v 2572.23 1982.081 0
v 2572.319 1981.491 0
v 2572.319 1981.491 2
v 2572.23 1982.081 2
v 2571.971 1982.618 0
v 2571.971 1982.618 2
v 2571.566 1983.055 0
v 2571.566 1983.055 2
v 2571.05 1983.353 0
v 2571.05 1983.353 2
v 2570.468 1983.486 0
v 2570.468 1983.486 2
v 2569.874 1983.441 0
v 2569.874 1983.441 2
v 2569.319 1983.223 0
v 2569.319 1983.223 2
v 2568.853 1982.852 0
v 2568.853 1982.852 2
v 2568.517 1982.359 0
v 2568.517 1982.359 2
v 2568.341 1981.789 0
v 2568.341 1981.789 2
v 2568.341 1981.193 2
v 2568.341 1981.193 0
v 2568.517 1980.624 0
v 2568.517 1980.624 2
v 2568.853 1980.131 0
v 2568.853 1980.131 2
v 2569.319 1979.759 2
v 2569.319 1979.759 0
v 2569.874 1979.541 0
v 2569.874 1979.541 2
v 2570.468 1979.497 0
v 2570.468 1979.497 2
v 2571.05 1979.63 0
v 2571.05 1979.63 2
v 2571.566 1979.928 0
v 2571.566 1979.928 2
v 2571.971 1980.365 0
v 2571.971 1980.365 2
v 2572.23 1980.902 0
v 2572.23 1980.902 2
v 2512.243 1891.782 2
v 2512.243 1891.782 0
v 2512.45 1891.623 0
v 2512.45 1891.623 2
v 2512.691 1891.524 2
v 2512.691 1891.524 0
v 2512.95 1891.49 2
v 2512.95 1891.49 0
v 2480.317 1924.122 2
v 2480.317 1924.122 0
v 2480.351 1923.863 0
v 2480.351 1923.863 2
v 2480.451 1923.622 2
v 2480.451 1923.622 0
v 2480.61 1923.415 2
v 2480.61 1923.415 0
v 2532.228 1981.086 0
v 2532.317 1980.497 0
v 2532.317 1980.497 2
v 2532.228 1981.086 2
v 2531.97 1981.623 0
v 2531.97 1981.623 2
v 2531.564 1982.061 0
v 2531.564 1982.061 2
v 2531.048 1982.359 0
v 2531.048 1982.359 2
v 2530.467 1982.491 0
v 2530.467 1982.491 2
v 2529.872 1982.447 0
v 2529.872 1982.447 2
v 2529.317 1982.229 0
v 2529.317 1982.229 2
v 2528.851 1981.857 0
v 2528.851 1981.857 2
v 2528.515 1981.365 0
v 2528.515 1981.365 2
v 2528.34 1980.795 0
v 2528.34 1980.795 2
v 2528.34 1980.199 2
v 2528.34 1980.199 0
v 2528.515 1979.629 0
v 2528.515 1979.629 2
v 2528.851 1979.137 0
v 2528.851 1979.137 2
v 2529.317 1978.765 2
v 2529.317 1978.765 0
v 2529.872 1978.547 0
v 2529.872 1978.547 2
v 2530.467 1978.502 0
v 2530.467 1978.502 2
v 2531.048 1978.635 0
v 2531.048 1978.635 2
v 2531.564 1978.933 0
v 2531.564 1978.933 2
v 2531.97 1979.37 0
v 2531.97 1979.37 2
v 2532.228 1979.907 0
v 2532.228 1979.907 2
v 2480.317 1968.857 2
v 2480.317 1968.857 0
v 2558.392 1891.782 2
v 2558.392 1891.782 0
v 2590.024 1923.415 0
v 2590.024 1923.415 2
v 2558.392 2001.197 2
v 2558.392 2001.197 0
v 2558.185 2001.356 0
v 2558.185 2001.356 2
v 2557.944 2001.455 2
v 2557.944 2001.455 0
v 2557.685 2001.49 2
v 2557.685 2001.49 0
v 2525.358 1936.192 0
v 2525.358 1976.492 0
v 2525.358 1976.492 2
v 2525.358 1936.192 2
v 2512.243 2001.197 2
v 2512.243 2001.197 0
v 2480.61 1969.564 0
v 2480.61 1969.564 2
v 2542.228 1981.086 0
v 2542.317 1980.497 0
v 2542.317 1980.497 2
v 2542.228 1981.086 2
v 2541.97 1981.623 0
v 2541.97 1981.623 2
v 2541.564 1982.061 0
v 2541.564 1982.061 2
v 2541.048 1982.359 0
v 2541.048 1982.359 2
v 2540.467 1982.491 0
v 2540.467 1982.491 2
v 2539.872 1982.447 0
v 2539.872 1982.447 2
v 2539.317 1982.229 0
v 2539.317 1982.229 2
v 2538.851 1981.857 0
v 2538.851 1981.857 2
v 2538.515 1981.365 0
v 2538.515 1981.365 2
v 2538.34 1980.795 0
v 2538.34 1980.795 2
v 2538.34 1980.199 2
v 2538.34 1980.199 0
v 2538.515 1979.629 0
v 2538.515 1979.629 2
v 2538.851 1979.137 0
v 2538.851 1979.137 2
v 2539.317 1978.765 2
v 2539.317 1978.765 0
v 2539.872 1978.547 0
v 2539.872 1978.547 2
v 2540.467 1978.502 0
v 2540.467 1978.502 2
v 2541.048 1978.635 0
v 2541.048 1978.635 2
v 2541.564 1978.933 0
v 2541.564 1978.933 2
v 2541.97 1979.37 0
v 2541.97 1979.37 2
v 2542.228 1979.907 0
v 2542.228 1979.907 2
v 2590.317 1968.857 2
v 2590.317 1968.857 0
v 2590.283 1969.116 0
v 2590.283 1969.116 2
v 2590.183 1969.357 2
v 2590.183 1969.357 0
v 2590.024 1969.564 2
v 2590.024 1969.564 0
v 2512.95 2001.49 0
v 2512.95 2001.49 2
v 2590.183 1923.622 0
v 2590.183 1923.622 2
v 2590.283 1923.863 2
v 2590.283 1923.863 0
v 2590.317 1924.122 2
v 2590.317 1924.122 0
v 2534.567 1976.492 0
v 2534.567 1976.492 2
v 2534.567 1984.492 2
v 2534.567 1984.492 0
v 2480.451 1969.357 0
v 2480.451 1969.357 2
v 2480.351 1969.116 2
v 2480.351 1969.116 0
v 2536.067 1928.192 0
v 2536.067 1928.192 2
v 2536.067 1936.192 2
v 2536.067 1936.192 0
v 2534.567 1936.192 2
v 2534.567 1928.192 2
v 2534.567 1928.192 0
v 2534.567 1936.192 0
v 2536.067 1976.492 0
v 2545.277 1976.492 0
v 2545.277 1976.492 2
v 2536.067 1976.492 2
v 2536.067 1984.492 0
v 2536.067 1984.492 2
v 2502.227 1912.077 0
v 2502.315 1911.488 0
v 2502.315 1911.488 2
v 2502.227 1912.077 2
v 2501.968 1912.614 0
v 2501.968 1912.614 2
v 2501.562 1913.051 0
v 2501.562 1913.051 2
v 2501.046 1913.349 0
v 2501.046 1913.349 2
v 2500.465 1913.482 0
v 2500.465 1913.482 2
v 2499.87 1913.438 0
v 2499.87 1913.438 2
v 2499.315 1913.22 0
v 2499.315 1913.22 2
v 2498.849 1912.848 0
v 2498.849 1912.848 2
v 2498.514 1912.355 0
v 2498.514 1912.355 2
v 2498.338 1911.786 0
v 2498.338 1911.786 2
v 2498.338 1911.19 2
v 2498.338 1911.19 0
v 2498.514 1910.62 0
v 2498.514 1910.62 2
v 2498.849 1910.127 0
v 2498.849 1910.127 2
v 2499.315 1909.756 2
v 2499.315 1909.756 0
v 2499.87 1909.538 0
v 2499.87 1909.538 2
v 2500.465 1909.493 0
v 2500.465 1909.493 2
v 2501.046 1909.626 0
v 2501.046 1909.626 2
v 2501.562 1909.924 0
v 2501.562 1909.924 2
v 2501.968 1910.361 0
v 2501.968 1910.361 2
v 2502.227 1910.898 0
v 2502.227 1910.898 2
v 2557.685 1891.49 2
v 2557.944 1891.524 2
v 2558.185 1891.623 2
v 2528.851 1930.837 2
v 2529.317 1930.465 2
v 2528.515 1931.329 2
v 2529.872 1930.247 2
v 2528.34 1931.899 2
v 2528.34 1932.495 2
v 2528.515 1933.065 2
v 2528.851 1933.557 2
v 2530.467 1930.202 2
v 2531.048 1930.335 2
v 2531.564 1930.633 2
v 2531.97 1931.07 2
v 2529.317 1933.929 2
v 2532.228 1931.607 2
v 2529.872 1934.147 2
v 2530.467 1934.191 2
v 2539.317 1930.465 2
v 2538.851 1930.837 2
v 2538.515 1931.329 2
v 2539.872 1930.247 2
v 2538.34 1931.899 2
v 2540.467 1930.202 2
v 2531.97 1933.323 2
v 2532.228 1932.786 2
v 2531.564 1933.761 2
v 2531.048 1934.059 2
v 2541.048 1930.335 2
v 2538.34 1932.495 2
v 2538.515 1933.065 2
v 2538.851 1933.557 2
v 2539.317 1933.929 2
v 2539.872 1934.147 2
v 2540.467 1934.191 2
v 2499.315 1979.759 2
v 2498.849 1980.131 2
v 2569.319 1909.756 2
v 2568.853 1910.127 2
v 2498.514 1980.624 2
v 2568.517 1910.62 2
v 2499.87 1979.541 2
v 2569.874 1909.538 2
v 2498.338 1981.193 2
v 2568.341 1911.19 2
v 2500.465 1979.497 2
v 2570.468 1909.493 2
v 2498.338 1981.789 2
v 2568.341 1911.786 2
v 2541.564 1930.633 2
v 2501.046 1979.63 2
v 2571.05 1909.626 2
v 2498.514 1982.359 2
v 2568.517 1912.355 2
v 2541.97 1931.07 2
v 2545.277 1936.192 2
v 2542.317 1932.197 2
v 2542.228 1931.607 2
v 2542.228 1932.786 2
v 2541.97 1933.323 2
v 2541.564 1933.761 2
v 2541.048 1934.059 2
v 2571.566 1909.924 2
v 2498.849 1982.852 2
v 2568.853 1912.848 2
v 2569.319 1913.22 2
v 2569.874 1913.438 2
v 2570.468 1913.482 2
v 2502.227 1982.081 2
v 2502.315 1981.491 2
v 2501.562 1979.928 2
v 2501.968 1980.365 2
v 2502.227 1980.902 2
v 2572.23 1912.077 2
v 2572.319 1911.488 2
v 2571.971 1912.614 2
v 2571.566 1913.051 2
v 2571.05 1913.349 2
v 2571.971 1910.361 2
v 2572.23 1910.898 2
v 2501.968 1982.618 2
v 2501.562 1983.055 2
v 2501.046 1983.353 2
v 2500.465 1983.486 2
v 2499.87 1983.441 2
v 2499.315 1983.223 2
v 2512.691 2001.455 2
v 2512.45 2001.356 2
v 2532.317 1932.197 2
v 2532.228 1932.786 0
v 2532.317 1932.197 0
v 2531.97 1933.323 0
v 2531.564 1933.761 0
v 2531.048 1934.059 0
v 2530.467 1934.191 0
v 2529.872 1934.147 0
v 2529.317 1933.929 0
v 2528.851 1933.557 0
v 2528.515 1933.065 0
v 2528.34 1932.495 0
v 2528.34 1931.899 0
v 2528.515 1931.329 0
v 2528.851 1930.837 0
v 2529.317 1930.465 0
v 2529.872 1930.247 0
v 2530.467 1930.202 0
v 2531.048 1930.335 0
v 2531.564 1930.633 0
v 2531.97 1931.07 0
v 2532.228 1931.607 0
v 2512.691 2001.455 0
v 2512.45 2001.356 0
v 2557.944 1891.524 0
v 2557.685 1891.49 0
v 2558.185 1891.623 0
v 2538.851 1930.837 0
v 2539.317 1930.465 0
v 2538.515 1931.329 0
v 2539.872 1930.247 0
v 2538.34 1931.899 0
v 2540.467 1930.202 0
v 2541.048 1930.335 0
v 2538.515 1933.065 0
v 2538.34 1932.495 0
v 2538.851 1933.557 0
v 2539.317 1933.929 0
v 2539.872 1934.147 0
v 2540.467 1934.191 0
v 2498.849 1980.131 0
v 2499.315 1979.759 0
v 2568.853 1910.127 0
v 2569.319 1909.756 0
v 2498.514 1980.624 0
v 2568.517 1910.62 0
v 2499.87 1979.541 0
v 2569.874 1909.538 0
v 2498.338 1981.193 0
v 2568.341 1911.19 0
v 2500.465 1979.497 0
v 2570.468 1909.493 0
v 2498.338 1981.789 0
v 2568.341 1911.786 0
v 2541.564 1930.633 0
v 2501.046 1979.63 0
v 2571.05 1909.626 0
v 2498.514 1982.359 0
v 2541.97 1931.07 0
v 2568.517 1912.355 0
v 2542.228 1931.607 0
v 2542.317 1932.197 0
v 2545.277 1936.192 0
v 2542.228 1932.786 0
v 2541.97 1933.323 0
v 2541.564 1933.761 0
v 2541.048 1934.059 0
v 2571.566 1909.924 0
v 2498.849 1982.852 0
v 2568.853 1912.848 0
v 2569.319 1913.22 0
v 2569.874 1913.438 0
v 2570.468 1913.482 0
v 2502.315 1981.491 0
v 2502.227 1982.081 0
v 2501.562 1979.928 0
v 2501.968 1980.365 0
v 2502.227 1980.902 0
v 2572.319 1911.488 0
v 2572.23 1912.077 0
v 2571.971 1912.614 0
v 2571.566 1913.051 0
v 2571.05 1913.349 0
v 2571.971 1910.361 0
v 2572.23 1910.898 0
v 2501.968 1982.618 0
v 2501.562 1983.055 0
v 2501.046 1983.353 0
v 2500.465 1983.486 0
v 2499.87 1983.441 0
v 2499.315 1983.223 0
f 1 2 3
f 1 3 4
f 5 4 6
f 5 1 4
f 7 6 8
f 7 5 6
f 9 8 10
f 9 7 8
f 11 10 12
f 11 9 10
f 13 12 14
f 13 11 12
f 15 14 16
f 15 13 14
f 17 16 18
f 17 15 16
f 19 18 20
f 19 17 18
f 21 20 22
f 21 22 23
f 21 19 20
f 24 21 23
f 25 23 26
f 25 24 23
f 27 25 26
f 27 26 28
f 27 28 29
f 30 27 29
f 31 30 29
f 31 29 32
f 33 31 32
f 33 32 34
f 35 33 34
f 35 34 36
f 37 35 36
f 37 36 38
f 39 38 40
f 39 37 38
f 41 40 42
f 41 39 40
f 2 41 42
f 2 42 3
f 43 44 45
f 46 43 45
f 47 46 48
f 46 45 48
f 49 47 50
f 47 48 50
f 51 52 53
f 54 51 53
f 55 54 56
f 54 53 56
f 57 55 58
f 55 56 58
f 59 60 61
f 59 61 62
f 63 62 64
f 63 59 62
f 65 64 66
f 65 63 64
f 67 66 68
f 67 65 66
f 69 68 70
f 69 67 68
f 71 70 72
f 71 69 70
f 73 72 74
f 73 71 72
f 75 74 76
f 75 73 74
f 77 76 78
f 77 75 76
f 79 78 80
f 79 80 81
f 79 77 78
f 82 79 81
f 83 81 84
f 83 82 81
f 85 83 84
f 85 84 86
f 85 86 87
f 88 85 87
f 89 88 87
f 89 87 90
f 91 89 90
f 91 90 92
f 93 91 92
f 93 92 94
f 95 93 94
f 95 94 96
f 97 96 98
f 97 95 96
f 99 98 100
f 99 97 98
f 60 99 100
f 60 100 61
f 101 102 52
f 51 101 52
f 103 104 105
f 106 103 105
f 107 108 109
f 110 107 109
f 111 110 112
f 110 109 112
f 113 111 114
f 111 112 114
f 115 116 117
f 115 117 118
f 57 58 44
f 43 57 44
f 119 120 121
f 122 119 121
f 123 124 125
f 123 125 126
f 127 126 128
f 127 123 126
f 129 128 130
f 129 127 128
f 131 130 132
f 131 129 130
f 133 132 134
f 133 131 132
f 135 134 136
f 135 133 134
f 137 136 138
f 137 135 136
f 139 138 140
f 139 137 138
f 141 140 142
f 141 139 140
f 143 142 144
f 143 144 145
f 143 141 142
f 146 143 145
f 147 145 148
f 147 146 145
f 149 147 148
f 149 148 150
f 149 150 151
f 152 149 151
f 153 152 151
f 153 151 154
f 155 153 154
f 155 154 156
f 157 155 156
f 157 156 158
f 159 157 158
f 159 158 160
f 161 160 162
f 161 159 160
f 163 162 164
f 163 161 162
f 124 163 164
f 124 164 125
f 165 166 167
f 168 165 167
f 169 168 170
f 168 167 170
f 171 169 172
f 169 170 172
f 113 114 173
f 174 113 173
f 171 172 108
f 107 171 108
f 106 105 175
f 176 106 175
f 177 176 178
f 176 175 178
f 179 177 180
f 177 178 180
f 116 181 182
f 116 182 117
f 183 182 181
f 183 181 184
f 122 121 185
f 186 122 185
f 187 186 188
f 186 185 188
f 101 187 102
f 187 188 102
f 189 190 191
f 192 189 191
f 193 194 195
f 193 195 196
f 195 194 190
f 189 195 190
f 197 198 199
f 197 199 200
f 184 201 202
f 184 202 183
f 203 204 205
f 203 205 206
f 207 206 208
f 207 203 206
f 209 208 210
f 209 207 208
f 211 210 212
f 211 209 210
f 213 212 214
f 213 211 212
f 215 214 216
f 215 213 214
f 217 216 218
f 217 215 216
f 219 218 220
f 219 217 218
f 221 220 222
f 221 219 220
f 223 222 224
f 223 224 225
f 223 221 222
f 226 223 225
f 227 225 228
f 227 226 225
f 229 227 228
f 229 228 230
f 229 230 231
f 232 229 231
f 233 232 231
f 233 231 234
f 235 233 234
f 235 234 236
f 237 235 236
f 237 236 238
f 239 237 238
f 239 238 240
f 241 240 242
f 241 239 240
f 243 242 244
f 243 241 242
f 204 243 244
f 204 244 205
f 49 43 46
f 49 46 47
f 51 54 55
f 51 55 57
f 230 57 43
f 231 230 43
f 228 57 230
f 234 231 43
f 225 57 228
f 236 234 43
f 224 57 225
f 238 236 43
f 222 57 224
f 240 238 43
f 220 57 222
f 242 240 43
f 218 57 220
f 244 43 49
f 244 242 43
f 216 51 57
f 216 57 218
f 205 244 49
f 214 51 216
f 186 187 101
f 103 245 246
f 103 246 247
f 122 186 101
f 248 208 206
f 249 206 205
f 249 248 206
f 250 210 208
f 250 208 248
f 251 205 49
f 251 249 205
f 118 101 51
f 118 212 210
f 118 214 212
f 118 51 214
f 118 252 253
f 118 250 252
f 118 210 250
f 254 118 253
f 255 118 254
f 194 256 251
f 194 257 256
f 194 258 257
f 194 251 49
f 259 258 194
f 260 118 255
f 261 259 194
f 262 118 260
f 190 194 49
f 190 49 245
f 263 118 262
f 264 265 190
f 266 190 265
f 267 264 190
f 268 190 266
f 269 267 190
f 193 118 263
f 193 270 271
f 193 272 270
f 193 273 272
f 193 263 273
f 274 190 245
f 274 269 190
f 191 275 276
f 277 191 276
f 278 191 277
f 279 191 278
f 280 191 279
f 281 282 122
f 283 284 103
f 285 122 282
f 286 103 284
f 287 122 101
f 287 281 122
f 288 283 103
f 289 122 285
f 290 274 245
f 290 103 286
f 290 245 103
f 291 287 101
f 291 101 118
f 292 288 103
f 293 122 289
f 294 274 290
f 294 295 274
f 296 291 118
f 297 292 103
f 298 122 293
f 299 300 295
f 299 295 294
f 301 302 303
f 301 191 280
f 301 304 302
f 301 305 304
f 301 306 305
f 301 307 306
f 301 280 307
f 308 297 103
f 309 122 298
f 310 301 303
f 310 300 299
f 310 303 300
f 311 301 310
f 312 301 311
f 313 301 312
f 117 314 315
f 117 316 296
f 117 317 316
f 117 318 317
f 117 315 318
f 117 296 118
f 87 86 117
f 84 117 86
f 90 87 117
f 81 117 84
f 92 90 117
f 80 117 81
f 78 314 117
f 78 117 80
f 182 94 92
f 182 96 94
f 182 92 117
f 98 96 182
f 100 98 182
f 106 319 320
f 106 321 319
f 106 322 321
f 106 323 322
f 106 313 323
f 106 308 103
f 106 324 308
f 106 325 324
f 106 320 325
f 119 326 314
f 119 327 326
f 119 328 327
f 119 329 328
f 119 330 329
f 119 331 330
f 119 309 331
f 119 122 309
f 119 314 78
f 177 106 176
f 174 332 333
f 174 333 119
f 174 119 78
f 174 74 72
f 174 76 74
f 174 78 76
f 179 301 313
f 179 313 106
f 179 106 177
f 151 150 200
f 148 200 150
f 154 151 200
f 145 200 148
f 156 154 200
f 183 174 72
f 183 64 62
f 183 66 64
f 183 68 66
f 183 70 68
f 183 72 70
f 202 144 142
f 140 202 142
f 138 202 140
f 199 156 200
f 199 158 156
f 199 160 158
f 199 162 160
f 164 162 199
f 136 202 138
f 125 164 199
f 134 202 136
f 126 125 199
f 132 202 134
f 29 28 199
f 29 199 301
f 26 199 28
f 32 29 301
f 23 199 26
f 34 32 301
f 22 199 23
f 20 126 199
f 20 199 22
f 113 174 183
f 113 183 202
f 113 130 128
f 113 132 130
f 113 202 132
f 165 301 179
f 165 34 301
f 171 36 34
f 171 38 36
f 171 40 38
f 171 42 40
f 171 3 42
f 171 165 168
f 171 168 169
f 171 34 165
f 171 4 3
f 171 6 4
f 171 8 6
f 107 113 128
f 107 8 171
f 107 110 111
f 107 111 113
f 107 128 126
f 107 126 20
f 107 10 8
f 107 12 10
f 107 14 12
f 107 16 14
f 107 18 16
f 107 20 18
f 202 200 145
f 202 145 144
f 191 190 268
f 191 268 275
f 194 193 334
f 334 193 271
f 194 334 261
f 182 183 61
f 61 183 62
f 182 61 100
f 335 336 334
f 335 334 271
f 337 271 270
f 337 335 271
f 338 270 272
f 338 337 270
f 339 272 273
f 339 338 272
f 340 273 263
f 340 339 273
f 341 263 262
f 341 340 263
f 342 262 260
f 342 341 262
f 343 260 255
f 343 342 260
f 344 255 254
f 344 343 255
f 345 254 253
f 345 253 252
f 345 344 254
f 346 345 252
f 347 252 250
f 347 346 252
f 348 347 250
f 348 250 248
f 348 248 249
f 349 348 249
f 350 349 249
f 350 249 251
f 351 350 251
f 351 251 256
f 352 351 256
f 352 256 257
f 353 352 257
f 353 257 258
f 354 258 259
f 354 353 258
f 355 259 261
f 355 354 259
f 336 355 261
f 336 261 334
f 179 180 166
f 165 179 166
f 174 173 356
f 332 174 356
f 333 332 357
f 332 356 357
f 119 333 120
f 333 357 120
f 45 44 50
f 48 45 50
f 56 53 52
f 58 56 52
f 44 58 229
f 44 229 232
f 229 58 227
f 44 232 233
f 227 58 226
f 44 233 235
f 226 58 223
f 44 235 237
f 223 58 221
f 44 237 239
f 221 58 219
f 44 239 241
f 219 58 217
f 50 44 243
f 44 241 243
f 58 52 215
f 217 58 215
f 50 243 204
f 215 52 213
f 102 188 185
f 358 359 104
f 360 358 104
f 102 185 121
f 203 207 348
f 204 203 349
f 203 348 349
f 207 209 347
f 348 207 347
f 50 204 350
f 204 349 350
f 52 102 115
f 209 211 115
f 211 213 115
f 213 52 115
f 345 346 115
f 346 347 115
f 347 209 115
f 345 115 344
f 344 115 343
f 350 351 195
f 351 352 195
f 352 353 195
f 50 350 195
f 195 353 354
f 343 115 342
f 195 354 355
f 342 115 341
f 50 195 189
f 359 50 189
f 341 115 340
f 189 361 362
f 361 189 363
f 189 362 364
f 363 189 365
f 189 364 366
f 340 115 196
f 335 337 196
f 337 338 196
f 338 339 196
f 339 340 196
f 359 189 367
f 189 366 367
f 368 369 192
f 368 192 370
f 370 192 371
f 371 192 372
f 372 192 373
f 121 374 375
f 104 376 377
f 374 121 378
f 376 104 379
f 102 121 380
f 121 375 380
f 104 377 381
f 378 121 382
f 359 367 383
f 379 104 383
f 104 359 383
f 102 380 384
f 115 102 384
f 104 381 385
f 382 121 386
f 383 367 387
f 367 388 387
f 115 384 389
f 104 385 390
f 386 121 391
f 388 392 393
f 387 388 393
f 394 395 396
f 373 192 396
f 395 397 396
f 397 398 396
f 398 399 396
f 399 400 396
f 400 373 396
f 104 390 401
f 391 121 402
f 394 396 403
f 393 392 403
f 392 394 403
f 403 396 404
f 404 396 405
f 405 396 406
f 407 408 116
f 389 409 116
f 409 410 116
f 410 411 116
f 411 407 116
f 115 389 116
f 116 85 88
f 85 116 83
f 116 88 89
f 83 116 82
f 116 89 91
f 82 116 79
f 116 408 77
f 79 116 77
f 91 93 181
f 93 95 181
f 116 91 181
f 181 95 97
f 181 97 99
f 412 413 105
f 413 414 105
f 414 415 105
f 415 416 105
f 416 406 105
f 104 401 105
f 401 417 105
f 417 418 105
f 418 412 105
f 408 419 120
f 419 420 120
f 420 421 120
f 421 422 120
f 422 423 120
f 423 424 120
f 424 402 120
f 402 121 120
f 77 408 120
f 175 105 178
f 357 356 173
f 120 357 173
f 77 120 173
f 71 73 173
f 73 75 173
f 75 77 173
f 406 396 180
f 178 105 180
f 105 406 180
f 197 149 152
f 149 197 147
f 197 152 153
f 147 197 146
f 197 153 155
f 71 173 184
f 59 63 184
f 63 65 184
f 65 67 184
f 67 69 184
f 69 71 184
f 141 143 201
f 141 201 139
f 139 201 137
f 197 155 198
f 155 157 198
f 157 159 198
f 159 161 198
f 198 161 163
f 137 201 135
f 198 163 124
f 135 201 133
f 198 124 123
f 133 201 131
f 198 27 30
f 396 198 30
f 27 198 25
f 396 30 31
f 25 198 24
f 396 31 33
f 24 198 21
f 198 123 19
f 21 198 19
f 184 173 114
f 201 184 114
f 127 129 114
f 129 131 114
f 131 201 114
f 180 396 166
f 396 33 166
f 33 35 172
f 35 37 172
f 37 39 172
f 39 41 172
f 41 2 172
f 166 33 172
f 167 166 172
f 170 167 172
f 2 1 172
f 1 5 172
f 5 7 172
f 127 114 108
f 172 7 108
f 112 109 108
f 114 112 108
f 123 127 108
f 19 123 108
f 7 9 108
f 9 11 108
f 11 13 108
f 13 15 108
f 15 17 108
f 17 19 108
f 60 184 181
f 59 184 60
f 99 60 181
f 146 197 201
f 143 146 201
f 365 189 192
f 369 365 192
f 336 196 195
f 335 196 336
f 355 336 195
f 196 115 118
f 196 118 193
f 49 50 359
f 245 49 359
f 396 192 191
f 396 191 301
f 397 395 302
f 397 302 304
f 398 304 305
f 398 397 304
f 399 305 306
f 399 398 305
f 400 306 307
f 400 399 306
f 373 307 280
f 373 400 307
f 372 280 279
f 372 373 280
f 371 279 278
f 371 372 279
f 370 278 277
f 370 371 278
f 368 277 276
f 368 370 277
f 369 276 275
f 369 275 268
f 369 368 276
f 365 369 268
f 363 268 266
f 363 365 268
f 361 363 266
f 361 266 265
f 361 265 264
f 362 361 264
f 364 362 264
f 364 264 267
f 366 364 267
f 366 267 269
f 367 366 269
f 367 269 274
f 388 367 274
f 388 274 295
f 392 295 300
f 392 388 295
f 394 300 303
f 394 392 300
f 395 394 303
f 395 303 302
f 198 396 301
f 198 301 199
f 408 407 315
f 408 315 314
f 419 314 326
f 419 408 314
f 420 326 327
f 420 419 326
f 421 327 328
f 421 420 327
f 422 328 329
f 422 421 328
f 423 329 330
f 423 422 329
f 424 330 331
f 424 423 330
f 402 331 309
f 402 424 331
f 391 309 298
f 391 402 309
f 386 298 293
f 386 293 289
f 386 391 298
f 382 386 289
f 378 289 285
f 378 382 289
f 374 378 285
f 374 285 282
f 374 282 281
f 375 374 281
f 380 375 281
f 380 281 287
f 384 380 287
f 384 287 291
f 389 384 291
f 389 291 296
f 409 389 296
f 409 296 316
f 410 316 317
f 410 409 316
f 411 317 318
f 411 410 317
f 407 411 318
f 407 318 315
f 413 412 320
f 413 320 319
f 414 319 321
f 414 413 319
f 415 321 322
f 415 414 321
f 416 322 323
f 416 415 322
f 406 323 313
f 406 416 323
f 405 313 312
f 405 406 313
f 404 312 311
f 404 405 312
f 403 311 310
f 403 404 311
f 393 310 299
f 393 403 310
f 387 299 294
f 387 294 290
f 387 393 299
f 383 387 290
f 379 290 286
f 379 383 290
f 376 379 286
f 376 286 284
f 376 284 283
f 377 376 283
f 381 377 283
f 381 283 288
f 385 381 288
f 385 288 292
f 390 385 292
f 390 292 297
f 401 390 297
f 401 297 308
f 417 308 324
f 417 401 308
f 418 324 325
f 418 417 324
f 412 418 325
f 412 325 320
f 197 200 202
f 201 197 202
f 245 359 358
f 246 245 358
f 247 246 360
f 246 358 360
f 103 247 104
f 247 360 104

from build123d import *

# Parameters (mm, degrees)
MODEL_R             = 2
EXTRUDE_1_DEPTH     = 2
SKETCH_3_W          = 0.1
SKETCH_3_H          = 8
CUT_EXTRUDE_1_DEPTH = 2
SKETCH_6_W          = 0.1
SKETCH_6_H          = 8
CUT_EXTRUDE_2_DEPTH = 2


with BuildPart() as part:
    # Model → 凸台-拉伸1 (new body)
    with BuildSketch(Plane.XY):
        with BuildLine():
            Line((2557.684762722, 2001.48951402), (2512.949697986, 2001.48951402))
            ThreePointArc((2512.949697986, 2001.48951402), (2512.567014553, 2001.413393553), (2512.242591205, 2001.196620802))
            Line((2512.242591205, 2001.196620802), (2480.610123573, 1969.56415317))
            ThreePointArc((2480.610123573, 1969.56415317), (2480.393350821, 1969.239729821), (2480.317230354, 1968.857046389))
            Line((2480.317230354, 1968.857046389), (2480.317230354, 1924.121981652))
            ThreePointArc((2480.317230354, 1924.121981652), (2480.393350821, 1923.73929822), (2480.610123573, 1923.414874871))
            Line((2480.610123573, 1923.414874871), (2512.242591205, 1891.782407239))
            ThreePointArc((2512.242591205, 1891.782407239), (2512.567014553, 1891.565634488), (2512.949697986, 1891.48951402))
            Line((2512.949697986, 1891.48951402), (2557.684762722, 1891.48951402))
            ThreePointArc((2557.684762722, 1891.48951402), (2558.067446154, 1891.565634488), (2558.391869503, 1891.782407239))
            Line((2558.391869503, 1891.782407239), (2590.024337135, 1923.414874871))
            ThreePointArc((2590.024337135, 1923.414874871), (2590.241109886, 1923.73929822), (2590.317230354, 1924.121981652))
            Line((2590.317230354, 1924.121981652), (2590.317230354, 1968.857046389))
            ThreePointArc((2590.317230354, 1968.857046389), (2590.241109886, 1969.239729821), (2590.024337135, 1969.56415317))
            Line((2590.024337135, 1969.56415317), (2558.391869503, 2001.196620802))
            ThreePointArc((2558.391869503, 2001.196620802), (2558.067446154, 2001.413393553), (2557.684762722, 2001.48951402))
        make_face()
        with Locations((2500.315444685, 1911.487728352)):
            Circle(MODEL_R, mode=Mode.SUBTRACT)
        with Locations((2570.319016023, 1981.491299689)):
            Circle(MODEL_R, mode=Mode.SUBTRACT)
        with Locations((2530.317230354, 1980.496859135)):
            Circle(MODEL_R, mode=Mode.SUBTRACT)
        with Locations((2540.317230354, 1932.196859135)):
            Circle(MODEL_R, mode=Mode.SUBTRACT)
        with Locations((2540.317230354, 1980.496859135)):
            Circle(MODEL_R, mode=Mode.SUBTRACT)
        with Locations((2500.315444685, 1981.491299689)):
            Circle(MODEL_R, mode=Mode.SUBTRACT)
        with Locations((2570.319016023, 1911.487728352)):
            Circle(MODEL_R, mode=Mode.SUBTRACT)
        with Locations((2530.317230354, 1932.196859135)):
            Circle(MODEL_R, mode=Mode.SUBTRACT)
        Polygon((2535.967230354, 1976.491859135), (2535.967230354, 1984.491859135), (2534.667230354, 1984.491859135), (2534.667230354, 1976.491859135), (2525.357779796, 1976.491859135), (2525.357779796, 1936.191859135), (2534.667230354, 1936.191859135), (2534.667230354, 1928.191859135), (2535.967230354, 1928.191859135), (2535.967230354, 1936.191859135), (2545.276680912, 1936.191859135), (2545.276680912, 1976.491859135), align=None, mode=Mode.SUBTRACT)
    extrude(amount=EXTRUDE_1_DEPTH)

    # 草图3 → 切除-拉伸1 (cut)
    with BuildSketch(Plane.XY.offset(2)):
        with Locations((2536.017230354, 1932.191859135)):
            Rectangle(SKETCH_3_W, SKETCH_3_H)
        with Locations((2534.617230354, 1932.191859135)):
            Rectangle(SKETCH_3_W, SKETCH_3_H)
    extrude(amount=-CUT_EXTRUDE_1_DEPTH, mode=Mode.SUBTRACT)

    # 草图6 → 切除-拉伸2 (cut)
    with BuildSketch(Plane.XY.offset(2)):
        with Locations((2536.017230354, 1980.491859135)):
            Rectangle(SKETCH_6_W, SKETCH_6_H)
        with Locations((2534.617230354, 1980.491859135)):
            Rectangle(SKETCH_6_W, SKETCH_6_H)
    extrude(amount=-CUT_EXTRUDE_2_DEPTH, mode=Mode.SUBTRACT)


solid = part.part
